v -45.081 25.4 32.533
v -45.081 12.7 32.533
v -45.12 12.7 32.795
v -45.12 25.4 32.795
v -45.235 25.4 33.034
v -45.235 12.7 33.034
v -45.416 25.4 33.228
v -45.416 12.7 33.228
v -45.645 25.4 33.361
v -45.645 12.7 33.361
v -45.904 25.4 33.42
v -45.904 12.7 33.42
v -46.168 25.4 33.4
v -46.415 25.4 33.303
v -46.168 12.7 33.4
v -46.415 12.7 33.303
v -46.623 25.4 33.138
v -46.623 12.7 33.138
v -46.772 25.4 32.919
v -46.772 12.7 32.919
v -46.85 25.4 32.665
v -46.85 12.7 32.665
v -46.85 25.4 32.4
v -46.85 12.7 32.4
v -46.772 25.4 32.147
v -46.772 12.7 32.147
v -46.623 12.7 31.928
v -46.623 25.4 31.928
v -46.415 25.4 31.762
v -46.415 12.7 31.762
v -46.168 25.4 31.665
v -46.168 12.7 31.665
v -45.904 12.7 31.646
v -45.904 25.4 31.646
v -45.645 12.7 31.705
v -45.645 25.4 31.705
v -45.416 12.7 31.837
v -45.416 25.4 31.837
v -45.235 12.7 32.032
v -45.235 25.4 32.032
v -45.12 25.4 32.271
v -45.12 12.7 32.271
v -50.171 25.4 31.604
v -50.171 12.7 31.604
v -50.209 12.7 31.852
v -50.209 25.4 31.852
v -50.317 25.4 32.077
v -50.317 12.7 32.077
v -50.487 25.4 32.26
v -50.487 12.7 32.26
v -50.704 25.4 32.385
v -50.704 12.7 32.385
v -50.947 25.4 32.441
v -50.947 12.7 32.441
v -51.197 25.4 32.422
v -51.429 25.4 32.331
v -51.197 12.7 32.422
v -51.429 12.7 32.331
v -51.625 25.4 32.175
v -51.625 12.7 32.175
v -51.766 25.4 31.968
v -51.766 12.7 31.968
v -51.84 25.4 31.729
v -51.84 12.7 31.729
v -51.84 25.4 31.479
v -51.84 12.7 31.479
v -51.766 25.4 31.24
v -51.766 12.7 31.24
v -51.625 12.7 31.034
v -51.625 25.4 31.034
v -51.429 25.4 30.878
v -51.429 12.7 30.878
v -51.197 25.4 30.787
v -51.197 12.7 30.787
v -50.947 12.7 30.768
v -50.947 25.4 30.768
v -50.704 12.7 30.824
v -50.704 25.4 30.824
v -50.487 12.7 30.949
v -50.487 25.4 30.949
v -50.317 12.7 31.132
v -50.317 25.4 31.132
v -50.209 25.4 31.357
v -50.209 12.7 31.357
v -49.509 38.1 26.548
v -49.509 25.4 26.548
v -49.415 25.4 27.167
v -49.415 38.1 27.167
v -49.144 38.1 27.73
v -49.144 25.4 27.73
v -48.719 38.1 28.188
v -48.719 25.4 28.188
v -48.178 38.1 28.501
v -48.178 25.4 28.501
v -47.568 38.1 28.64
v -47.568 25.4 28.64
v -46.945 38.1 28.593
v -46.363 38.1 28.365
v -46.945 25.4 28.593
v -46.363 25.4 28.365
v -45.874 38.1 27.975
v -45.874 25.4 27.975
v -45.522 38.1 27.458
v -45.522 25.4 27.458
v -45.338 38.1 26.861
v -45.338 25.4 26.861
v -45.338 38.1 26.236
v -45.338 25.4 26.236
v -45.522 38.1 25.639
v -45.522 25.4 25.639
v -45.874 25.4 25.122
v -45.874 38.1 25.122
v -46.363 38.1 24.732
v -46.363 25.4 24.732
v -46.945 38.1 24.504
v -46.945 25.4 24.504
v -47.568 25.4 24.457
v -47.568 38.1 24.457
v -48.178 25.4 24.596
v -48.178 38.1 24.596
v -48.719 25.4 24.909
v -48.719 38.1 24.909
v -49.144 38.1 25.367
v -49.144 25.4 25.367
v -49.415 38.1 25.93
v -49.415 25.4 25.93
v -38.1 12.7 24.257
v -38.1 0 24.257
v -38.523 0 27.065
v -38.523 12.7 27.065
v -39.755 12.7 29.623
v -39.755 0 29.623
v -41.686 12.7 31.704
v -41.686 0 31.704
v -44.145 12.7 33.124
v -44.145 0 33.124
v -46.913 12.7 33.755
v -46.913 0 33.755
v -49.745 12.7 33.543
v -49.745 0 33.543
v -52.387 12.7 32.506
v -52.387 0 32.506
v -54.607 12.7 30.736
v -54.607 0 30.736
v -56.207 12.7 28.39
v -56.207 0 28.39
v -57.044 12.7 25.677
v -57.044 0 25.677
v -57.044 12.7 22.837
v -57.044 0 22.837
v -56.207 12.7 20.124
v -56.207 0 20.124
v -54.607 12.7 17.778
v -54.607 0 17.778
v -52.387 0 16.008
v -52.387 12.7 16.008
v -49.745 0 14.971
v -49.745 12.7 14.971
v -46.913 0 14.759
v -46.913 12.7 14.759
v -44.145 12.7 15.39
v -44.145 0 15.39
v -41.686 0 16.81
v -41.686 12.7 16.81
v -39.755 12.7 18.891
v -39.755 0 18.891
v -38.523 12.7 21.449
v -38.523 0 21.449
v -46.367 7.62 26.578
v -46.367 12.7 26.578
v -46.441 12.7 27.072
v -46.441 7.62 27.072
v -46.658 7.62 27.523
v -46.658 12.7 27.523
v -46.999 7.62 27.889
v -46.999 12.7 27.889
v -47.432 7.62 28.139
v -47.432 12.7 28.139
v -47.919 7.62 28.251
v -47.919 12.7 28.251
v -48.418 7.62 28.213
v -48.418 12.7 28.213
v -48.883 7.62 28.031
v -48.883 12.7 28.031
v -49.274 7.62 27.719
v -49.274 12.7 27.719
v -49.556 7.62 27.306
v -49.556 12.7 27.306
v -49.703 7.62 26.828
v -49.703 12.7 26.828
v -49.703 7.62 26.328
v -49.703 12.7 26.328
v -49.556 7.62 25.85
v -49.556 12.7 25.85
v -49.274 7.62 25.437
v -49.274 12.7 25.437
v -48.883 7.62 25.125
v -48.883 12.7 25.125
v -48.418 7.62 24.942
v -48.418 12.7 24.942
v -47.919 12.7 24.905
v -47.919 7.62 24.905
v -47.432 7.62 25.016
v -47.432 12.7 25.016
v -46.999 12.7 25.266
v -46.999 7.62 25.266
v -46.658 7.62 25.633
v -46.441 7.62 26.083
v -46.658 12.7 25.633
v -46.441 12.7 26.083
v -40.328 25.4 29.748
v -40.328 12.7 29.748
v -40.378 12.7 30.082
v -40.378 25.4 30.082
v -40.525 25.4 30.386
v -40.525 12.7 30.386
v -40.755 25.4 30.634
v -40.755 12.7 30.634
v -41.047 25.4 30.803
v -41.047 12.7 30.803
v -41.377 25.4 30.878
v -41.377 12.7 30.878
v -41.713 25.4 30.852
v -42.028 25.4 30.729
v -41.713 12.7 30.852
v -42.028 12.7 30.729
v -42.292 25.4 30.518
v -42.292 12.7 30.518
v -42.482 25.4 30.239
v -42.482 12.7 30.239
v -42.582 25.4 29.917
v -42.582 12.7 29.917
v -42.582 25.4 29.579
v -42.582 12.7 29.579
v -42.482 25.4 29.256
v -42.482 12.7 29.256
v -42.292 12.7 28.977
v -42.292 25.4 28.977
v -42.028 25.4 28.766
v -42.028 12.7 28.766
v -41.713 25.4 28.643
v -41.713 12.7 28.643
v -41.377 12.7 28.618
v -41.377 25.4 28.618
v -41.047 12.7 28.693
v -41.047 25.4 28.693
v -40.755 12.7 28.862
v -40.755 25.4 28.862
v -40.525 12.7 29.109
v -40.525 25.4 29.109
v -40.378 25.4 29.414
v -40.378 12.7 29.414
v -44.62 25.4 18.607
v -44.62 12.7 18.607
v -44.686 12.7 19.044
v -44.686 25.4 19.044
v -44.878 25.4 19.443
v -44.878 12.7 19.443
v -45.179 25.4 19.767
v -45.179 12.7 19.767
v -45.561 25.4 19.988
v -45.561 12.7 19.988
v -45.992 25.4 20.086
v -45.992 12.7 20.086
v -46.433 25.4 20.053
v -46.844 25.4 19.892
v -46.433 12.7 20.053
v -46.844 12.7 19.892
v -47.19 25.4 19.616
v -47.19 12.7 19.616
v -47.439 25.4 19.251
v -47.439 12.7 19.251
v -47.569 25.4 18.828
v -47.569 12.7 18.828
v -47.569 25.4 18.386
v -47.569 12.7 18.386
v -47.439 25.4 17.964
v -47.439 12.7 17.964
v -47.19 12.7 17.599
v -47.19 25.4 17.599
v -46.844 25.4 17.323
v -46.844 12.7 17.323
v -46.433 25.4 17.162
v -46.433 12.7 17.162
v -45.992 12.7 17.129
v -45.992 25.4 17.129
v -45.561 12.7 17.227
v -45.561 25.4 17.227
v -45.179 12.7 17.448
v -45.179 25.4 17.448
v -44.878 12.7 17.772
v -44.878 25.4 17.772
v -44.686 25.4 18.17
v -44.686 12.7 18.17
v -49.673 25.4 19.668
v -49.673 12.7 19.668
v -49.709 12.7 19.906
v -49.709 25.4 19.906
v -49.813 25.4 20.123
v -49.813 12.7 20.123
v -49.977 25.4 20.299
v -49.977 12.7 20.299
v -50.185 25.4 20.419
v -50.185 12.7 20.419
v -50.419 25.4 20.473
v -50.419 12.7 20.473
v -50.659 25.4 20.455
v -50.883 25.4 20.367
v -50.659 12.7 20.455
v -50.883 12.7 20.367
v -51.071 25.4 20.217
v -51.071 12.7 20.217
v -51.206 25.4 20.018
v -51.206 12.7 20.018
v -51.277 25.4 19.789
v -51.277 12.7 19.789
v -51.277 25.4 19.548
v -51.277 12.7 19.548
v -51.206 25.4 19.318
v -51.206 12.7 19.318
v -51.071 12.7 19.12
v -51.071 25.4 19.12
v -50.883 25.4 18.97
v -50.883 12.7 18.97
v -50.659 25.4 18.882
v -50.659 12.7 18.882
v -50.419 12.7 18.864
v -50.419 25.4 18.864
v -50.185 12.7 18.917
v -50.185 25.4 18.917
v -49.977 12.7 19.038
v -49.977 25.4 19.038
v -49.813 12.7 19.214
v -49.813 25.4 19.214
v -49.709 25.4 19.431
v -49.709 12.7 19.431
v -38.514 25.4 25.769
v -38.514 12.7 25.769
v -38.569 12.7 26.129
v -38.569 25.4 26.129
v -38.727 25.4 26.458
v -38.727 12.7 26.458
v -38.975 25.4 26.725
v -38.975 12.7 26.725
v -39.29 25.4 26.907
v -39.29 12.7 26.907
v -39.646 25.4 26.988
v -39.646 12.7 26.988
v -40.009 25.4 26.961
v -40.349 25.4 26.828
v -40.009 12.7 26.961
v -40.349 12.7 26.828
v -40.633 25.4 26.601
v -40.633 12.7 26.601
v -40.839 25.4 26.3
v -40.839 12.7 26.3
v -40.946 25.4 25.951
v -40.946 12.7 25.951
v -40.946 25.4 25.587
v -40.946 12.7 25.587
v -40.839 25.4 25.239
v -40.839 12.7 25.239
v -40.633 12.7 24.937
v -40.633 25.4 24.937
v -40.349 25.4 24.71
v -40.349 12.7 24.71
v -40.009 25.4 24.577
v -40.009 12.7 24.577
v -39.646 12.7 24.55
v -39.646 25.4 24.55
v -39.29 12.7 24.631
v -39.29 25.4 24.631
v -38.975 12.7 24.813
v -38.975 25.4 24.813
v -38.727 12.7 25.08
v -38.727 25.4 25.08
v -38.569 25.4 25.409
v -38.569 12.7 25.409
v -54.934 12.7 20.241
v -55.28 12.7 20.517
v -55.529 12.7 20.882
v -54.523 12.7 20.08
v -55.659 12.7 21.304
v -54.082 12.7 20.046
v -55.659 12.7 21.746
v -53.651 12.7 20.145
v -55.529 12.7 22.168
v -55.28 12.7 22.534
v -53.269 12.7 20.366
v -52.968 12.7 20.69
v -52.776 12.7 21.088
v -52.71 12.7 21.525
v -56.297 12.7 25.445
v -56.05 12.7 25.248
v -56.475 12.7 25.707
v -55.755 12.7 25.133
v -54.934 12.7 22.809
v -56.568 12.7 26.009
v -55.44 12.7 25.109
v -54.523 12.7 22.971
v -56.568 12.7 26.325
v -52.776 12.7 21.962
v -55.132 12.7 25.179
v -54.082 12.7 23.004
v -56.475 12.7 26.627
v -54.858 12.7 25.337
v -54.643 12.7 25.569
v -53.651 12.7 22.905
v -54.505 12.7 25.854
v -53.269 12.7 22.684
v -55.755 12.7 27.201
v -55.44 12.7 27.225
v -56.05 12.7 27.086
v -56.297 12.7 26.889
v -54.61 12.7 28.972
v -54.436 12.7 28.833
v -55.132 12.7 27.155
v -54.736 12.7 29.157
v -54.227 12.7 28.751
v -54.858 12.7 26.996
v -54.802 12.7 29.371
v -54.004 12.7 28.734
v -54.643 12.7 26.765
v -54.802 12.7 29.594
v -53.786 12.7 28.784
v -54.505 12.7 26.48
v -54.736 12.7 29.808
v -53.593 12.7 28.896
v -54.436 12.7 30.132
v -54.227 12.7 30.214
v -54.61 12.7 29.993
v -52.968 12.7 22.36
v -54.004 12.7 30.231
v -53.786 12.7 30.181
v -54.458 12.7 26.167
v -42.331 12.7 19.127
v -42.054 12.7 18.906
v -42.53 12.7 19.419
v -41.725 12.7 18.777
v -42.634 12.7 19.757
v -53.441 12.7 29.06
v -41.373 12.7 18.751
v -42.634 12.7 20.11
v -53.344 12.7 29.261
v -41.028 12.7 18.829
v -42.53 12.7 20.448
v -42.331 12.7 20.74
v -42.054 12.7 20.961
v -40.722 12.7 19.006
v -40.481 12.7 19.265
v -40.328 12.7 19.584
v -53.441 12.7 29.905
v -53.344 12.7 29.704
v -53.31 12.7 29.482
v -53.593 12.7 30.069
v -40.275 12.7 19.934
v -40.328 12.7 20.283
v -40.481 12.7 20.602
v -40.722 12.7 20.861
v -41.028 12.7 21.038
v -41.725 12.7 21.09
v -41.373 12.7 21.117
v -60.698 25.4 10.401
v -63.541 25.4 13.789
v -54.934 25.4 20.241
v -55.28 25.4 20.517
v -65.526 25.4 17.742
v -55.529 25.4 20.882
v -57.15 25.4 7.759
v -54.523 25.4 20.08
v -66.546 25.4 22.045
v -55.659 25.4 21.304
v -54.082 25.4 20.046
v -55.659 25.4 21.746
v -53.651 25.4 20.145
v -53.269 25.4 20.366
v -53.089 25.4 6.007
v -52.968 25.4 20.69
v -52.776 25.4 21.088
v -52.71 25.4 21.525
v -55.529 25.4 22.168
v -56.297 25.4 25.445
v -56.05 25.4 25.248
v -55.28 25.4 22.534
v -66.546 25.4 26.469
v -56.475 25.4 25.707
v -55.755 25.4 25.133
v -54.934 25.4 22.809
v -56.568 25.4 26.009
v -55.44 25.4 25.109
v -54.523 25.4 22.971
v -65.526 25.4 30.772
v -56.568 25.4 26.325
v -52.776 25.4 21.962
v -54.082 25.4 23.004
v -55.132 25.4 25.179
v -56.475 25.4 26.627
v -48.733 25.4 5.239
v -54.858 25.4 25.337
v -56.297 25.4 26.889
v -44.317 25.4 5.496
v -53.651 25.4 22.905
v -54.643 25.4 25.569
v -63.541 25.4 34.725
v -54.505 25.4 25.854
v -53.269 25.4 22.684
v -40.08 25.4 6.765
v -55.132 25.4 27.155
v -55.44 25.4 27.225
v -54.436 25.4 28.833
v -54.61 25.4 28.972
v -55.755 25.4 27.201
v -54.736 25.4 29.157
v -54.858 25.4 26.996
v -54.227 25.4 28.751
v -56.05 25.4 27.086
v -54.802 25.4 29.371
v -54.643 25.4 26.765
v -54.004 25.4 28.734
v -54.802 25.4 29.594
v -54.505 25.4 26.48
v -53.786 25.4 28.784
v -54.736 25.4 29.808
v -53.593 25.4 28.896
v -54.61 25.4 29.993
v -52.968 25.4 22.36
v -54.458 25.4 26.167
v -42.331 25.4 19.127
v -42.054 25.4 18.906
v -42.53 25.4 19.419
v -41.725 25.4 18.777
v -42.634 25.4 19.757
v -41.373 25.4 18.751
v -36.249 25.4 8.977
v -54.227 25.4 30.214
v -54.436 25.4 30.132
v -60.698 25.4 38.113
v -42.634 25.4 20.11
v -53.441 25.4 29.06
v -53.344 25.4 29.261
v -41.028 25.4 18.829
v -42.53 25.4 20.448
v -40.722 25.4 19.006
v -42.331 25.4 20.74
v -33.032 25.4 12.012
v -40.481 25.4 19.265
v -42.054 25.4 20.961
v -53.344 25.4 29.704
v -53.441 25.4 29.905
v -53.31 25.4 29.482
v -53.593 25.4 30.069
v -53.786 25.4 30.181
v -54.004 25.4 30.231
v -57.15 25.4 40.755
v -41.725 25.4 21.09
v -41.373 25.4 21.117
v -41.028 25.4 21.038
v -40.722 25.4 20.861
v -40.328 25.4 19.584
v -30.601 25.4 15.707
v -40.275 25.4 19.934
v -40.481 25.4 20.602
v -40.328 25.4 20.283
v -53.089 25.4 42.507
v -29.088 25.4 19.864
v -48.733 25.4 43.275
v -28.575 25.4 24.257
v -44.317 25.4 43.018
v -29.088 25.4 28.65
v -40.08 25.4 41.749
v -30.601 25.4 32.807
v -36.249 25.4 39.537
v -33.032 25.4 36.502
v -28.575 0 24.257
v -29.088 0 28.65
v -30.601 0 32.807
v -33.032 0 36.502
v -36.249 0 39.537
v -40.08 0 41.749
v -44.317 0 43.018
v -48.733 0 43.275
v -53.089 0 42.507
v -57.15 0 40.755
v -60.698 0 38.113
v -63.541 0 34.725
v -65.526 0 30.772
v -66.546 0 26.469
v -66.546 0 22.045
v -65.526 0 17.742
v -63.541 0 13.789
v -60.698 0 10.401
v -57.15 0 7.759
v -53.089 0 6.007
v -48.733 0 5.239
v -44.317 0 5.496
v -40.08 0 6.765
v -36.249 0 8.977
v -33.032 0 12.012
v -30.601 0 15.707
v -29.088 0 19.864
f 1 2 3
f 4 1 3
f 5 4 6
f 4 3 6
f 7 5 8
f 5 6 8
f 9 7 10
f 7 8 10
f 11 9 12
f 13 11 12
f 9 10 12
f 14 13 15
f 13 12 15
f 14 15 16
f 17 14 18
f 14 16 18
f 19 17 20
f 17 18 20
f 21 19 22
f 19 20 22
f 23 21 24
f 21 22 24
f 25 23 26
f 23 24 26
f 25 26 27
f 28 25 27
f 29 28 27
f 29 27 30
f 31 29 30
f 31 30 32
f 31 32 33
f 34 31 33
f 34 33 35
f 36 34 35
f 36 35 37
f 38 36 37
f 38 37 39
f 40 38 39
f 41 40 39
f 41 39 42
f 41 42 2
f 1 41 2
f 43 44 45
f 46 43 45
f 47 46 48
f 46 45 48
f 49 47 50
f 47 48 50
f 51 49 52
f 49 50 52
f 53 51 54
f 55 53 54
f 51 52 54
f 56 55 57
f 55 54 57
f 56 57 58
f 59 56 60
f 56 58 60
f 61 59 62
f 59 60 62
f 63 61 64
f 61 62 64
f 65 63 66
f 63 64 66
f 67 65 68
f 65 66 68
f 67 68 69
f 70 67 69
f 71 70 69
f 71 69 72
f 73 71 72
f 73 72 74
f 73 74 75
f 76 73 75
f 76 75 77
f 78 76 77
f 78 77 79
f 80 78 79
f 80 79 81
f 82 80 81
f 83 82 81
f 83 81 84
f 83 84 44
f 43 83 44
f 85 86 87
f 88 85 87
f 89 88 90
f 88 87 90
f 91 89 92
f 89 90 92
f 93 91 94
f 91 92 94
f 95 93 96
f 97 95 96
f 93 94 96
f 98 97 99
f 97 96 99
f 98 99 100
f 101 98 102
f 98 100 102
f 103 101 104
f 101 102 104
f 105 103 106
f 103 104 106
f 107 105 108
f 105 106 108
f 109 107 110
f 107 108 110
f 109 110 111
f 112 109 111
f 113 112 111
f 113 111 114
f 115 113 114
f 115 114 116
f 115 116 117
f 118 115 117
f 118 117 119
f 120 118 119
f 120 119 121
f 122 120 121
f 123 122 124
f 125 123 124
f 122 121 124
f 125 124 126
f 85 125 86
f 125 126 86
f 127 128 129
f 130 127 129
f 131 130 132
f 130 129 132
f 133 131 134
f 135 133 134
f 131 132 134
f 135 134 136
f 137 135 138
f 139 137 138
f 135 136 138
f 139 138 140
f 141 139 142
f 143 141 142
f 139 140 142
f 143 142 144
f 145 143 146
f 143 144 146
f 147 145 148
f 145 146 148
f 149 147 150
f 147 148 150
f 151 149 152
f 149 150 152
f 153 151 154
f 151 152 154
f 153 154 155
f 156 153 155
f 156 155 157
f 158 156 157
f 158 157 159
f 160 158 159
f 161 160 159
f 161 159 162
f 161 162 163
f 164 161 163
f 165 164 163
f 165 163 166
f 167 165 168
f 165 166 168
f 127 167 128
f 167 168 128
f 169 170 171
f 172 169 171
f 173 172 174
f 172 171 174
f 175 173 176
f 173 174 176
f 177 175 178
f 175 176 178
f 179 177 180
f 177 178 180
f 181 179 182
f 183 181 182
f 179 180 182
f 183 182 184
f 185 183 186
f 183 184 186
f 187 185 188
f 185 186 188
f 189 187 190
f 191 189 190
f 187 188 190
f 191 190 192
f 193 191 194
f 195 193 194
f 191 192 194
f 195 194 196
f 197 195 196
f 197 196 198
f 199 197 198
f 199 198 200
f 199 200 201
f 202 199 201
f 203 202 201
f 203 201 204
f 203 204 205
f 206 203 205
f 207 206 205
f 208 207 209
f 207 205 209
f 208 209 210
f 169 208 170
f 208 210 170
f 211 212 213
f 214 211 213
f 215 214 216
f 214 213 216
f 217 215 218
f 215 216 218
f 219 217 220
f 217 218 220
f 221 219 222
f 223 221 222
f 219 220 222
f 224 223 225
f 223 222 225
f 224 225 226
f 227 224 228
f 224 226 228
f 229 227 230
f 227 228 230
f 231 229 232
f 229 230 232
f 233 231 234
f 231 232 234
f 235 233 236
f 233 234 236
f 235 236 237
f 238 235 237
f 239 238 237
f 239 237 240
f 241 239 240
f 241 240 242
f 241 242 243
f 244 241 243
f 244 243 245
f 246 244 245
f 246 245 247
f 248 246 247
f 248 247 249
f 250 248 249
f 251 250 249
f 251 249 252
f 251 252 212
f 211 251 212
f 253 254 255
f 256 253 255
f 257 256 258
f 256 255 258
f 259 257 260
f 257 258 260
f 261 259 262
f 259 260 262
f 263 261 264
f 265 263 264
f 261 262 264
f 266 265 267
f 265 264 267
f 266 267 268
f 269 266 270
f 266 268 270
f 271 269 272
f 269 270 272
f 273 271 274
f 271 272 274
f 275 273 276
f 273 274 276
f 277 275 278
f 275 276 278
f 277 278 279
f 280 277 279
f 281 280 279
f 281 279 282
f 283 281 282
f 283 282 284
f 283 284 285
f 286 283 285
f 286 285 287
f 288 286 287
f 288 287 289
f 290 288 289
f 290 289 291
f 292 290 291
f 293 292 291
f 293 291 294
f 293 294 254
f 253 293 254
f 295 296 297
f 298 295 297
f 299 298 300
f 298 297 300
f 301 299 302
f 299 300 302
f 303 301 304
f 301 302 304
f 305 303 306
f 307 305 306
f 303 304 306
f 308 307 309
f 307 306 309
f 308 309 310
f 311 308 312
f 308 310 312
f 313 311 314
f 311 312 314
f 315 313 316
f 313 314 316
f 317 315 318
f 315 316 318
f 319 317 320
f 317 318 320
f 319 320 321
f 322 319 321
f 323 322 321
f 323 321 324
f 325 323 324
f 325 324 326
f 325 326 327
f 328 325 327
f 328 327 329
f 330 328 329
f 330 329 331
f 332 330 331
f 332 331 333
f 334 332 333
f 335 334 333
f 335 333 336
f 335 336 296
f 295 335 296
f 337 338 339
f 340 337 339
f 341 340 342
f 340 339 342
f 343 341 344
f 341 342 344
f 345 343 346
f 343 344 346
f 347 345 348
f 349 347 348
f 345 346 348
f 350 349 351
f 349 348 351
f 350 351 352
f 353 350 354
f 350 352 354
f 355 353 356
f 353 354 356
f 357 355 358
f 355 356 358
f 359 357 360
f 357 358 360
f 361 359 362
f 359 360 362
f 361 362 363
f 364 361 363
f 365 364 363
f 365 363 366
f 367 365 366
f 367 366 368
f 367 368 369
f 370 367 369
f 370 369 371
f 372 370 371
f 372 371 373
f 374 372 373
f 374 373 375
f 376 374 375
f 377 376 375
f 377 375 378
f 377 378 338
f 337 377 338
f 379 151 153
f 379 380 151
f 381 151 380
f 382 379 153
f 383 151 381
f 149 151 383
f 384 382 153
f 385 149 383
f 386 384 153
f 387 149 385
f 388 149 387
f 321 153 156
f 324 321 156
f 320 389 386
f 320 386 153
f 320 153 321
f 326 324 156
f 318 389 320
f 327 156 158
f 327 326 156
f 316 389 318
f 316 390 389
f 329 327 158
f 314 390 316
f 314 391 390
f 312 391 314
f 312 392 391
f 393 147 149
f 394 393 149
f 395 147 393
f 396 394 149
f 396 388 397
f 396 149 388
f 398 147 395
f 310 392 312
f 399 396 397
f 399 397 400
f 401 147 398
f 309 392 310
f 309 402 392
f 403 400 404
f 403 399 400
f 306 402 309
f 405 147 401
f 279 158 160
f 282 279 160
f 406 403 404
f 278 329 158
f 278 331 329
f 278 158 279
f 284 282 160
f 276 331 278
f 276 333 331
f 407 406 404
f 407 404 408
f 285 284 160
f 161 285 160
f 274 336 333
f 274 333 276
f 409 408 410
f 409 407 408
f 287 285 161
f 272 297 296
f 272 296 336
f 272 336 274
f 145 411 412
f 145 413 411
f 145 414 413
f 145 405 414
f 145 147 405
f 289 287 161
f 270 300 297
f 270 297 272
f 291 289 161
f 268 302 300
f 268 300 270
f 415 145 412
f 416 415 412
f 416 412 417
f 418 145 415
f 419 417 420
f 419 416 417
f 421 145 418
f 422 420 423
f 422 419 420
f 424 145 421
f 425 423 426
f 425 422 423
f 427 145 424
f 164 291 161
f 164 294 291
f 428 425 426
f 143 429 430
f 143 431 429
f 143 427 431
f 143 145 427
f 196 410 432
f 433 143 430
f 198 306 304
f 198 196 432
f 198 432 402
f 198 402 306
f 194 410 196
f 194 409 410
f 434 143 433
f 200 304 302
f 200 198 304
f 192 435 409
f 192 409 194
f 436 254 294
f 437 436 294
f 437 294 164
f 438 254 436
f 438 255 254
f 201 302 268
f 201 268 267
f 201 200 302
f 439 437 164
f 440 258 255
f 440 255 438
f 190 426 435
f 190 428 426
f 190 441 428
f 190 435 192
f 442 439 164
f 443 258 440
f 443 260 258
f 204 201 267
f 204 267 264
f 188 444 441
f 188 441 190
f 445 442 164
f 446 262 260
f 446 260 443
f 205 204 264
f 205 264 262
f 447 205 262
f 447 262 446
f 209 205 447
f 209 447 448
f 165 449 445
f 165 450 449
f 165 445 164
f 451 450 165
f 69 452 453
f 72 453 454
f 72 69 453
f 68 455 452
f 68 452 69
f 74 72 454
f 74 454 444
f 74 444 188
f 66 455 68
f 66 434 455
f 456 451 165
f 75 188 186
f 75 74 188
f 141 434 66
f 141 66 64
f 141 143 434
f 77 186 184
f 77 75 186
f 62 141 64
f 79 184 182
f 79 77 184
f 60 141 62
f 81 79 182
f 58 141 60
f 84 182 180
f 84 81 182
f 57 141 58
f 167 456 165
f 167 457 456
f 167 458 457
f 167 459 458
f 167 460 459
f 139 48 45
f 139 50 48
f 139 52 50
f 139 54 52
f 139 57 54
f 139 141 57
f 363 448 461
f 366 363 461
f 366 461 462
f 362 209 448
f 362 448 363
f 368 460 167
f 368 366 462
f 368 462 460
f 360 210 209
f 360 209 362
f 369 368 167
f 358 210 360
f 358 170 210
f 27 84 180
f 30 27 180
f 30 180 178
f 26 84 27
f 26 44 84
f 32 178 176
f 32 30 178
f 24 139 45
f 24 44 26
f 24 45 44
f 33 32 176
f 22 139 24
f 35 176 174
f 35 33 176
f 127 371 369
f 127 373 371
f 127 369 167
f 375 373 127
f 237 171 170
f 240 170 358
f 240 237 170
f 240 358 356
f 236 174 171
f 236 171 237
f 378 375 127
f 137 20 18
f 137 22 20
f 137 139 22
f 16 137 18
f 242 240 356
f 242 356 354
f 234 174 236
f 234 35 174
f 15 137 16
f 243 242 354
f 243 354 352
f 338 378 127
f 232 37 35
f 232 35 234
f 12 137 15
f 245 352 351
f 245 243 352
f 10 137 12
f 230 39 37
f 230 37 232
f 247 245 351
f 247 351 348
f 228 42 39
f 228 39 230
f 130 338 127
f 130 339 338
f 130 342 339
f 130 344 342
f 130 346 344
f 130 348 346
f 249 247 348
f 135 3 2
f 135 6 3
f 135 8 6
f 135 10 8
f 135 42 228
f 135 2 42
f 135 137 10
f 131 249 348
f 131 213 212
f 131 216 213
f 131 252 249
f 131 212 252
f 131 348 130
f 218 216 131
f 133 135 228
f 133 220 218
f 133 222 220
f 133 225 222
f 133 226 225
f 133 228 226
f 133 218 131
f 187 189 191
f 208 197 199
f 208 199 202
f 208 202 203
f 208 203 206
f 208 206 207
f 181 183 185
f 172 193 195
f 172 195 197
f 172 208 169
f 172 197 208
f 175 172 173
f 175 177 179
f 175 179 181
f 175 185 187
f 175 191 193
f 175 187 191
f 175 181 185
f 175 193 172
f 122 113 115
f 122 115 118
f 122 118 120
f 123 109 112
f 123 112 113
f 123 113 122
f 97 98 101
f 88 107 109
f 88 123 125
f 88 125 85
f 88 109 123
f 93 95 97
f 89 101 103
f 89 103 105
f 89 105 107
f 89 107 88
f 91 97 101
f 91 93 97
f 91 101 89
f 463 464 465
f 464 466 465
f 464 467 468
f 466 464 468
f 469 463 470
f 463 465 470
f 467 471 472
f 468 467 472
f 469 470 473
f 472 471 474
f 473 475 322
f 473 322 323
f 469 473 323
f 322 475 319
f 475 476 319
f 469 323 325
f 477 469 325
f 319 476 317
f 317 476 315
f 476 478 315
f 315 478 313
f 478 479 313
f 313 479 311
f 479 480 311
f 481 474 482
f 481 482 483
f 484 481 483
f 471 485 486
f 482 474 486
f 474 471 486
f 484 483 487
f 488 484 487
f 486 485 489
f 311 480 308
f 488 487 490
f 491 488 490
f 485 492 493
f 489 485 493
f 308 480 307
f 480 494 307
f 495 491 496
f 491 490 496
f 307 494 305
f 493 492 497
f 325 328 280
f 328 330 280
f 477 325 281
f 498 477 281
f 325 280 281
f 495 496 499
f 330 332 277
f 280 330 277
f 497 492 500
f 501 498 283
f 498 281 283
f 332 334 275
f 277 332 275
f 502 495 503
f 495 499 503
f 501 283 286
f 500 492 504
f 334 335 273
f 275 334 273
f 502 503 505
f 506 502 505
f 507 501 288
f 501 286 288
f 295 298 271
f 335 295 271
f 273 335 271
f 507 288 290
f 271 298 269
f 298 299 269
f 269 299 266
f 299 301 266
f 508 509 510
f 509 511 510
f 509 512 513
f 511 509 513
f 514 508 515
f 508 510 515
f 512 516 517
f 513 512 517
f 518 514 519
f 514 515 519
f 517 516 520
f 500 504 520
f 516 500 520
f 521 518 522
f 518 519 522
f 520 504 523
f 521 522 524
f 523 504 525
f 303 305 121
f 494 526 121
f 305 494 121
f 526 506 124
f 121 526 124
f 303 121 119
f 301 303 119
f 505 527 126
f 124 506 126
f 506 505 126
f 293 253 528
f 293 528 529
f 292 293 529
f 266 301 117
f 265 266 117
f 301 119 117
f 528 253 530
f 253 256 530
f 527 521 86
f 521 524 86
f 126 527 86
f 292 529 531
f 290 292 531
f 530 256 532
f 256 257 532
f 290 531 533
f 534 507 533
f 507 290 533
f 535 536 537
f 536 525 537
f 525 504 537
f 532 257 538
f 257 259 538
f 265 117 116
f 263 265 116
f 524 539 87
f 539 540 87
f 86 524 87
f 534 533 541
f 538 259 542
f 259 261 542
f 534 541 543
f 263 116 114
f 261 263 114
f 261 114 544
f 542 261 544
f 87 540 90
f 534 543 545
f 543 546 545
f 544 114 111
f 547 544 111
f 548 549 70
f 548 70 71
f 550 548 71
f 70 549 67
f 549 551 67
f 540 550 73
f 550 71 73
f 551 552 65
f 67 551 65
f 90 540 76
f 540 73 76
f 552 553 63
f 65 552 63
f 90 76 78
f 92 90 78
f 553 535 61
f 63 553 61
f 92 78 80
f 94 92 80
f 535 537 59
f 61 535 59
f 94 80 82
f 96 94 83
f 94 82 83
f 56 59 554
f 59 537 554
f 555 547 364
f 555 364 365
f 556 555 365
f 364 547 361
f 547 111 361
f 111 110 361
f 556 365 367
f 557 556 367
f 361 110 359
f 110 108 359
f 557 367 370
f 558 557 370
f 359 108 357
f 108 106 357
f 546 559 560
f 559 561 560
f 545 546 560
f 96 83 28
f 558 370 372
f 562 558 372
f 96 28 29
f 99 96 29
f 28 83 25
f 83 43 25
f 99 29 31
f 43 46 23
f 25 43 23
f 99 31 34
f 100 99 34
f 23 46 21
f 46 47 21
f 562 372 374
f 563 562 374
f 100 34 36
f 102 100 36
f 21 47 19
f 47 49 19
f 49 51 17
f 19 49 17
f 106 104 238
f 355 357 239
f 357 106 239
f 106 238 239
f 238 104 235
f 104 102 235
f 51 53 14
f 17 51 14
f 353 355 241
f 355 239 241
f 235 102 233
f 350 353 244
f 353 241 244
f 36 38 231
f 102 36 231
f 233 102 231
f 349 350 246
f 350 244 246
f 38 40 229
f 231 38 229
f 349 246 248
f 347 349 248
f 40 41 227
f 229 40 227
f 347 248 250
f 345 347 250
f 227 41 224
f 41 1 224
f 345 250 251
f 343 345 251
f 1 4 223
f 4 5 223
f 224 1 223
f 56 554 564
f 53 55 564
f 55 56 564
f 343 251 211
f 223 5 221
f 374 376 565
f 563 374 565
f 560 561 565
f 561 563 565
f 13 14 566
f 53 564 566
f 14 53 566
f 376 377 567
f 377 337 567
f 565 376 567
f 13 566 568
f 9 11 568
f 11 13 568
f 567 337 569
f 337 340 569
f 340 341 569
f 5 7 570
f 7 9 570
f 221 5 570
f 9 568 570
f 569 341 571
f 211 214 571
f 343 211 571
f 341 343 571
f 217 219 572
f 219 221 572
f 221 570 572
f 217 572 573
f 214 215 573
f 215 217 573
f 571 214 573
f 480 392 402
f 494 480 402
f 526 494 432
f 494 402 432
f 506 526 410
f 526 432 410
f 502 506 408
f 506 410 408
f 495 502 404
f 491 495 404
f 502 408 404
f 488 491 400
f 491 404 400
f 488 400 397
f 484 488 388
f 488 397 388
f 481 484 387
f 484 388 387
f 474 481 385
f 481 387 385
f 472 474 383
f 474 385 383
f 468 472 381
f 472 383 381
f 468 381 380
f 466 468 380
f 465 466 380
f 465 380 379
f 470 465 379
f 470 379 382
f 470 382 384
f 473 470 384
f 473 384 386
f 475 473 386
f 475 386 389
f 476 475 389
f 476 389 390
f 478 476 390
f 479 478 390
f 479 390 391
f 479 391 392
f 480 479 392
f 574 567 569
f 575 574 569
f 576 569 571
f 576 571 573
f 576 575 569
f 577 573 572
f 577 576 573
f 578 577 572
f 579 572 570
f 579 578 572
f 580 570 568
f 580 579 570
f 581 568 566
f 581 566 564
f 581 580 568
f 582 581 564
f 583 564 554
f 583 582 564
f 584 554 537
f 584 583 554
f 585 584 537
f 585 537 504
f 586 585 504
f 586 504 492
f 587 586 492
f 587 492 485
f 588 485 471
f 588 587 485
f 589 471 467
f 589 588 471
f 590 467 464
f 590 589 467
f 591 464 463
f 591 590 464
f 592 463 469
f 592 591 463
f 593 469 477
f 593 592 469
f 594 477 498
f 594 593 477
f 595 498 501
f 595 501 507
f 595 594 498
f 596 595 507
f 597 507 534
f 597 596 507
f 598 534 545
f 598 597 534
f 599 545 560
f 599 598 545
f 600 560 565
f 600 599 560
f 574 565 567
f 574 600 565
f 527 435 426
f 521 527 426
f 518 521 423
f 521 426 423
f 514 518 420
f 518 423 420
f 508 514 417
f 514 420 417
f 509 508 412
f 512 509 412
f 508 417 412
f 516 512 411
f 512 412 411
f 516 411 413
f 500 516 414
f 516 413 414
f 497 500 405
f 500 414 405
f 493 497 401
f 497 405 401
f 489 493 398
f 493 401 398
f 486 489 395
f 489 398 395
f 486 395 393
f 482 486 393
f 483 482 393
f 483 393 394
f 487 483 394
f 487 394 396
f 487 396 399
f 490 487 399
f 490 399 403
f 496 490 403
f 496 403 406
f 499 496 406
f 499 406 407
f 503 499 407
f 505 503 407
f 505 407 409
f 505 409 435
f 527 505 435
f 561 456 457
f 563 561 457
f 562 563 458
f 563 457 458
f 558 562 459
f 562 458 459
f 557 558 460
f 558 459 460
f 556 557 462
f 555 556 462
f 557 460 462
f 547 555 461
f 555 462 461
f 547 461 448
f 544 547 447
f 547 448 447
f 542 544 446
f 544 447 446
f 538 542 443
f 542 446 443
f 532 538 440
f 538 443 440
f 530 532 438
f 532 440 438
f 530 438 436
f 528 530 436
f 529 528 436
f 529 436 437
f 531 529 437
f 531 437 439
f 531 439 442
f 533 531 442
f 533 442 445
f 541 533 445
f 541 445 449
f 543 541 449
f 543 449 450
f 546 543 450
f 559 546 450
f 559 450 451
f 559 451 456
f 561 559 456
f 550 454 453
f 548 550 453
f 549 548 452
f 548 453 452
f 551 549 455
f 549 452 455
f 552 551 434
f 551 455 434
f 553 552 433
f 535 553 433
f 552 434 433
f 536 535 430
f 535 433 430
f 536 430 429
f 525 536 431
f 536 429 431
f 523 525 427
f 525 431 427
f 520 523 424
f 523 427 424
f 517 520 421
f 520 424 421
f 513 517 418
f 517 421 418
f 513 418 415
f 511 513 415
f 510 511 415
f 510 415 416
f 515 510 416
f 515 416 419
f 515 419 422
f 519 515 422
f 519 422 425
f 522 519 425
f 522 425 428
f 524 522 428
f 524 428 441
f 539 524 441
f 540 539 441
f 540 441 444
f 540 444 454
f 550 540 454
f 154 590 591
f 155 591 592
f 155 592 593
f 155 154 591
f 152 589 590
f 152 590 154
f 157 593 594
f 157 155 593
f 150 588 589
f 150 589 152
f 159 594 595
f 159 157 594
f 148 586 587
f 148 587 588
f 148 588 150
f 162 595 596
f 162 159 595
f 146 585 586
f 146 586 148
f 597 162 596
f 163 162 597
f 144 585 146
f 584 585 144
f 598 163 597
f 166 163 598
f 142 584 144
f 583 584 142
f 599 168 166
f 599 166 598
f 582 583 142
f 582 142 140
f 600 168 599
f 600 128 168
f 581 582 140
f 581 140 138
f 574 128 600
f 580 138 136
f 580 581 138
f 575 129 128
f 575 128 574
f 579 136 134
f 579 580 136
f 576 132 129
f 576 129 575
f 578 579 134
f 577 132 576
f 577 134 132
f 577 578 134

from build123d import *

# Parameters (mm, degrees)
F0_R      = 19.05
F1_DEPTH  = 25.4
F2_R      = 9.525
F3_DEPTH  = 12.7
F4_R      = 1.133132
F4_R_2    = 0.889661
F4_R_3    = 0.83878
F4_R_4    = 0.750228
F4_R_5    = 1.060981
F4_R_6    = 1.482769
F4_R_7    = 0.806713
F4_R_8    = 1.482771
F4_R_9    = 1.186214
F4_R_10   = 1.22272
F5_DEPTH  = 25.4
F7_R      = 1.677648
F8_DEPTH  = 5.08
F9_R      = 2.09708
F10_DEPTH = 12.7


with BuildPart() as f1:
    # F0 (on Front) → F1 (new body)
    with BuildSketch(Plane.XZ):
        with Locations((-47.624998, 24.257001)):
            Circle(F0_R)
    extrude(amount=-F1_DEPTH)

    # F2 (on face) → F3 (cut)
    with BuildSketch(Plane.XZ):
        with Locations((-47.624998, 24.257001)):
            Circle(F2_R)
    extrude(amount=-F3_DEPTH, mode=Mode.SUBTRACT)

    # F4 (on face) → F5 (cut)
    with BuildSketch(Plane.XZ.offset(-12.7)):
        with Locations((-41.461259, 29.747711)):
            Circle(F4_R)
        with Locations((-45.970432, 32.532789)):
            Circle(F4_R_2)
        with Locations((-51.010098, 31.604432)):
            Circle(F4_R_3)
        with Locations((-54.060422, 29.482467)):
            Circle(F4_R_4)
        with Locations((-55.519272, 26.166897)):
            Circle(F4_R_5)
        with Locations((-54.193046, 21.5251)):
            Circle(F4_R_6)
        with Locations((-50.479606, 19.668382)):
            Circle(F4_R_7)
        with Locations((-46.103057, 18.6074)):
            Circle(F4_R_8)
        with Locations((-41.461259, 19.933628)):
            Circle(F4_R_9)
        with Locations((-39.737161, 25.769029)):
            Circle(F4_R_10)
    extrude(amount=-F5_DEPTH, mode=Mode.SUBTRACT)

    # F7 (on face) → F8 (join)
    with BuildSketch(Plane.XZ.offset(-12.7)):
        with Locations((-48.044514, 26.577691)):
            Circle(F7_R)
    extrude(amount=F8_DEPTH)

    # F9 (on face) → F10 (join)
    with BuildSketch(Plane(origin=(0, 25.4, 0), x_dir=(-1, 0, 0), z_dir=(0, 1, 0))):
        with Locations((47.411542, 26.54841)):
            Circle(F9_R)
    extrude(amount=F10_DEPTH)


solid = f1.part
